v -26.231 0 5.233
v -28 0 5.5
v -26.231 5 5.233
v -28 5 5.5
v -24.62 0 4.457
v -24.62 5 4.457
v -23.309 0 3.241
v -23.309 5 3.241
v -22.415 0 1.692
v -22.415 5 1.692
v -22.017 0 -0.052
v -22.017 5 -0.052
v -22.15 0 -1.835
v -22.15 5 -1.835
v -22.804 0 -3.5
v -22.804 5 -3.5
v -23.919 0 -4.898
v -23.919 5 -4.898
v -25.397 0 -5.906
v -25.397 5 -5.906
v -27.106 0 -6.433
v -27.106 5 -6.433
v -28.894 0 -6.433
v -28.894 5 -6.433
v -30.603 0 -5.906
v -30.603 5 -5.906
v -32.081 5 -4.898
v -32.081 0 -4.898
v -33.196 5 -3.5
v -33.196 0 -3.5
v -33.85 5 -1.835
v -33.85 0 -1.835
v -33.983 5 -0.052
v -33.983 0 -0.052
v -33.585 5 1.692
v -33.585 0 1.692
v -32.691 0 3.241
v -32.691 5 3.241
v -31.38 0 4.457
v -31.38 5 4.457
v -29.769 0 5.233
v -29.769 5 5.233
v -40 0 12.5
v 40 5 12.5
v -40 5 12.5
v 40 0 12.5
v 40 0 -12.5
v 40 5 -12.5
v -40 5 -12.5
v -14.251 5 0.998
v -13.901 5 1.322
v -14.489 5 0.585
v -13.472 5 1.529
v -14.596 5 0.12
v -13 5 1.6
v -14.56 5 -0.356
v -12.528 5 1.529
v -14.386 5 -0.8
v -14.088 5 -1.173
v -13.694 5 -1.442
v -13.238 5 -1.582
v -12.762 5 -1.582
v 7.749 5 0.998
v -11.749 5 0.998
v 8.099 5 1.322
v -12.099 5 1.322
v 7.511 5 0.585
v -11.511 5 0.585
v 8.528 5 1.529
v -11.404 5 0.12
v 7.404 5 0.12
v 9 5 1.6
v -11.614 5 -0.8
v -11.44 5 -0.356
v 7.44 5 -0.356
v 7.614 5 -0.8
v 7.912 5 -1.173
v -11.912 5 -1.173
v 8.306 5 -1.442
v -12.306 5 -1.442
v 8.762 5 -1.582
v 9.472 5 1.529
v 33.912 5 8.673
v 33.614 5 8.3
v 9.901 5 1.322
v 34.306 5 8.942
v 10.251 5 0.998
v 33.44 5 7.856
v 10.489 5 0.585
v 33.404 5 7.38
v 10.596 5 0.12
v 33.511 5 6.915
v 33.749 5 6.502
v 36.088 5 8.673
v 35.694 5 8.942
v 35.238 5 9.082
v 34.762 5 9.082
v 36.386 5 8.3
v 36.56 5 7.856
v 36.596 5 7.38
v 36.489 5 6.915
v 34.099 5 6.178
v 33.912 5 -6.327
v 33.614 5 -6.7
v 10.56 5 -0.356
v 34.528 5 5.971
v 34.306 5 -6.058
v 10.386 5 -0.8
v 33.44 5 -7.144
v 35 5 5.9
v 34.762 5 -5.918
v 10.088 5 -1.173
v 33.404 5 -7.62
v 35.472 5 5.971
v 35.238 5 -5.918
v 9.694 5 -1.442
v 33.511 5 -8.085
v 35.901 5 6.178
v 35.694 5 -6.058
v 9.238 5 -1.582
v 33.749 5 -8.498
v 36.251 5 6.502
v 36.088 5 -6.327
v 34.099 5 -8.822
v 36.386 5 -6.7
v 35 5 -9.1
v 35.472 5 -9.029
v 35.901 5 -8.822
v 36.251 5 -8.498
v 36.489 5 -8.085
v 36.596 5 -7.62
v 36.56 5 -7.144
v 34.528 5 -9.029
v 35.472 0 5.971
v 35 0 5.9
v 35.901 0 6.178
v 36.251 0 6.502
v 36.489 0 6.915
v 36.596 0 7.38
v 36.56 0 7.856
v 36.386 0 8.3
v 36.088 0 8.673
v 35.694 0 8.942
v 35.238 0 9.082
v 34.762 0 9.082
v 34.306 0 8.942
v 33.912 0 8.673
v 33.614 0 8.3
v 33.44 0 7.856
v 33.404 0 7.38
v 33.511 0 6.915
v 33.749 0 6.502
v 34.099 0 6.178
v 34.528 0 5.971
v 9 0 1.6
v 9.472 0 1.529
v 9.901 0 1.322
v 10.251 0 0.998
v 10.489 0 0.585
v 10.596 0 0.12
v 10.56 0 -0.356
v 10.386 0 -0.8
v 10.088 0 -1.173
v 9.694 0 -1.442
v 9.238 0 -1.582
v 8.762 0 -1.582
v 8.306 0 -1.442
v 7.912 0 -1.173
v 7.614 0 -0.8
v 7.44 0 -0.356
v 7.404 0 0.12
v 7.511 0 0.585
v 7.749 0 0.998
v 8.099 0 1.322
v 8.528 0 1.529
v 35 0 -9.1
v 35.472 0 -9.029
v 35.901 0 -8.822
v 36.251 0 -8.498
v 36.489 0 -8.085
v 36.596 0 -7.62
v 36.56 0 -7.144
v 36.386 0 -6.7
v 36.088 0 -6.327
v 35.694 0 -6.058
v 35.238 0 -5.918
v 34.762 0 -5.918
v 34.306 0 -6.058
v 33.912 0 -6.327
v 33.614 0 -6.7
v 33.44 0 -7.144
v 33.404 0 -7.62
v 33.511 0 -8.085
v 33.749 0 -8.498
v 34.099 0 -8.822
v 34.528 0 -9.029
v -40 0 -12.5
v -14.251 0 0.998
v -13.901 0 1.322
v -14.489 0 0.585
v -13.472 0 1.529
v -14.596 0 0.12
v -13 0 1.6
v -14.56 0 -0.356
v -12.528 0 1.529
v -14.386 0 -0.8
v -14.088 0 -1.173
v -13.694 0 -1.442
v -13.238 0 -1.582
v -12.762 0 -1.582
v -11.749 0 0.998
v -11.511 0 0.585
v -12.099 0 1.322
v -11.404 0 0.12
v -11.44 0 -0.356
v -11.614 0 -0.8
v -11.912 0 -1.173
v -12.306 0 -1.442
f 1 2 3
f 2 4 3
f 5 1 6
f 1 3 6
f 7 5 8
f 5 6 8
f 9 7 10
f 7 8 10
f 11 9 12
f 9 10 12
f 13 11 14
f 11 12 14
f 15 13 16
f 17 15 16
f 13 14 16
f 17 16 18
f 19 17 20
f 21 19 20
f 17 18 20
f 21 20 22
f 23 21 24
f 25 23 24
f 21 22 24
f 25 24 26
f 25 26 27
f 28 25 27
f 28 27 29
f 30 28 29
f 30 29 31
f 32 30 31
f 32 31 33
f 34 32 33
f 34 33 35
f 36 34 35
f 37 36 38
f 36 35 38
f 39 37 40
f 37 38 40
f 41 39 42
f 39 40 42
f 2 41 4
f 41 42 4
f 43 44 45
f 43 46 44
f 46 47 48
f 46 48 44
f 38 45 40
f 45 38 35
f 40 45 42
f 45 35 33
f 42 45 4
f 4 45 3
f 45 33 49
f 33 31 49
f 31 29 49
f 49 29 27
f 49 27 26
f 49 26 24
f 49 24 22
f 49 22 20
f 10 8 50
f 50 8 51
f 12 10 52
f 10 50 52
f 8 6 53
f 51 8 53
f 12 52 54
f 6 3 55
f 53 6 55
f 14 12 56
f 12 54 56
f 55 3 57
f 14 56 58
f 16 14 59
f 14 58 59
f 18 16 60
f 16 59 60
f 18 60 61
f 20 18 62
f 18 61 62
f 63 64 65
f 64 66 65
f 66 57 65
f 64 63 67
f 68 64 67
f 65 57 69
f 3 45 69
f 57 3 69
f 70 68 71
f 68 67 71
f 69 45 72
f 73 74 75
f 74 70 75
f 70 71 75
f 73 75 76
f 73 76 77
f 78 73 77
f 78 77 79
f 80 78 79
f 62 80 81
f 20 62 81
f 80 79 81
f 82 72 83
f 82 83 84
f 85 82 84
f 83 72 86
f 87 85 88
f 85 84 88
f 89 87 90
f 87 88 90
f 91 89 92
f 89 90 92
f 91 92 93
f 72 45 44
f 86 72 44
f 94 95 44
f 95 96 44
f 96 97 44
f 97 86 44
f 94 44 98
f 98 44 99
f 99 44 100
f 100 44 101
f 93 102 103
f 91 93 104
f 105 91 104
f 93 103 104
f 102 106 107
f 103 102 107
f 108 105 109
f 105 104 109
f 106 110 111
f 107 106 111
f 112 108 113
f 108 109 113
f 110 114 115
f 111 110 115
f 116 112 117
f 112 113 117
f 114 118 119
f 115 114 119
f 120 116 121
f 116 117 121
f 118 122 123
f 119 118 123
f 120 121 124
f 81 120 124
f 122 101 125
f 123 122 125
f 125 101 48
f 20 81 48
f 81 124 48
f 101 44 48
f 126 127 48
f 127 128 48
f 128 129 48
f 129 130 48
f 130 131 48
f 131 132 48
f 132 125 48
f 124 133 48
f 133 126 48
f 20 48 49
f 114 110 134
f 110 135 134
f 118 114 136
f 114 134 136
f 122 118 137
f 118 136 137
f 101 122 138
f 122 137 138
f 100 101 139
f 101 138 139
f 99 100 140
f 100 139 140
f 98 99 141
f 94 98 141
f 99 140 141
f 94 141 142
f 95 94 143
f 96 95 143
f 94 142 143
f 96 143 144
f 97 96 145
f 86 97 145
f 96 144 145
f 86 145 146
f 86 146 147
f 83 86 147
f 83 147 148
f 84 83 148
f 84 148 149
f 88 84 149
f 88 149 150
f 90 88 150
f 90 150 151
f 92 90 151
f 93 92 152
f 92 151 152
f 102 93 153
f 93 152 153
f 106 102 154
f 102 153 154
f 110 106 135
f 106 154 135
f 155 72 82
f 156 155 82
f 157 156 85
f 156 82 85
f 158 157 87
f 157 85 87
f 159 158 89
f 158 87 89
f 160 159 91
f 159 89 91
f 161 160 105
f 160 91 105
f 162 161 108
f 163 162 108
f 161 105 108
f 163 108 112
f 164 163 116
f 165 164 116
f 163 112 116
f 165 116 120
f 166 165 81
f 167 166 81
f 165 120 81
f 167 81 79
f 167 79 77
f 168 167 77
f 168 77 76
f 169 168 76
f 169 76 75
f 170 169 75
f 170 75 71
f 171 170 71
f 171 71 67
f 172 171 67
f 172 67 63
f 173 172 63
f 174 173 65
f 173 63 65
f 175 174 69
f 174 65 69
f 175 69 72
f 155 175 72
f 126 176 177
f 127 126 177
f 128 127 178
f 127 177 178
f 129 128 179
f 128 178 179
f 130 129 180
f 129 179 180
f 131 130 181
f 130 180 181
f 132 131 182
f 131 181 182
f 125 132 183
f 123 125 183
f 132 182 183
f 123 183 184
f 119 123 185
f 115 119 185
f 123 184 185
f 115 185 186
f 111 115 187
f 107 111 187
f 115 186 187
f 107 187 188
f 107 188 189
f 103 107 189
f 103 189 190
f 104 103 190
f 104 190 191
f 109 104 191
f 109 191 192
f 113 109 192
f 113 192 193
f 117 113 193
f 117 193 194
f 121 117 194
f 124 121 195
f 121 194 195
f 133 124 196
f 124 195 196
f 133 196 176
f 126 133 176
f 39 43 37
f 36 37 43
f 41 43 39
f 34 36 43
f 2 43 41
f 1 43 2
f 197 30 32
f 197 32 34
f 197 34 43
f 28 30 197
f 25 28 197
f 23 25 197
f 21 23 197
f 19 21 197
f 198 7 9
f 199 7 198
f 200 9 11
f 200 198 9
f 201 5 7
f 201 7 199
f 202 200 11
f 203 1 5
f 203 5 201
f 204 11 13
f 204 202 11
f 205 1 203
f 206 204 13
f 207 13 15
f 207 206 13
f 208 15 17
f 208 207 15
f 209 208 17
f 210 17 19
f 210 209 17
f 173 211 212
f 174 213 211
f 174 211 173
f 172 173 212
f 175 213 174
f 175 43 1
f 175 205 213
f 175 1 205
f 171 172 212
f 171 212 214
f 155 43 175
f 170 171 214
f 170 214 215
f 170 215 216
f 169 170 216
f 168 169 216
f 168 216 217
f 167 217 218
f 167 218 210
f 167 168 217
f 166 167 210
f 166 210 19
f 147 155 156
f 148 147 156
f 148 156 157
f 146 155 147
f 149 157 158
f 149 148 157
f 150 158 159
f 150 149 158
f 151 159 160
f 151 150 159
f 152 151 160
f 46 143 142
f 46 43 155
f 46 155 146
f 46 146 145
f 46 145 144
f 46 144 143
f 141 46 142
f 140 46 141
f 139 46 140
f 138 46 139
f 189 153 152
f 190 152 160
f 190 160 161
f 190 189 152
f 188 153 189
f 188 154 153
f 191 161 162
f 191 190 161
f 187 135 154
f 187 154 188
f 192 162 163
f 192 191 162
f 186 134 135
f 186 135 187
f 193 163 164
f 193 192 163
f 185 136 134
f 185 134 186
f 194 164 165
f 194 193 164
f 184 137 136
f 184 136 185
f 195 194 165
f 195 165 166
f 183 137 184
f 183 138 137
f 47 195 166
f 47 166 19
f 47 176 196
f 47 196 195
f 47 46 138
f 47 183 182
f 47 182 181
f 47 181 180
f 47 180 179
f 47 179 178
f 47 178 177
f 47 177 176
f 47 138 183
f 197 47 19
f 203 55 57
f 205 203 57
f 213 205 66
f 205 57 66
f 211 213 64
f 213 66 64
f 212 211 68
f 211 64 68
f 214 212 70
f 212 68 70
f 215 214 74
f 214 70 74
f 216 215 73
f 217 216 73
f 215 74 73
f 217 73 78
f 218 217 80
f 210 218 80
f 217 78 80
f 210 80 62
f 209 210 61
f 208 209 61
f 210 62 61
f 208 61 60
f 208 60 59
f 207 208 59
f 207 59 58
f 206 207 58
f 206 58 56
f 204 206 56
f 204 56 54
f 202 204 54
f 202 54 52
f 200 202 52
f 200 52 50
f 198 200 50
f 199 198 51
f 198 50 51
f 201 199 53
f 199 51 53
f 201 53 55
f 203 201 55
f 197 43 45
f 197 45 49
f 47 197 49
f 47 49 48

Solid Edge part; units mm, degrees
sketch "Sketch1" plane through (0, 0, 0) normal (0, 1, 0) x (-1, 0, 0)
  line L0 (40, -12.5) -> (-40, -12.5)
  line L1 (-40, -12.5) -> (-40, 12.5)
  line L2 (-40, 12.5) -> (40, 12.5)
  line L3 (40, 12.5) -> (40, -12.5)
  dimension "D1" = 80
  dimension "D2" = 25
extrude "Protrusion1" add sketch "Sketch1" along normal blind 5
hole "Hole_5" at (-28, 5, -0.5) direction (0, -1, 0) diameter 12 end through all
hole "Hole_15" at (35, 0, 7.5) direction (0, 1, 0) diameter 3.2 end through all
hole "Hole1" at (35, 0, -7.5) direction (0, 1, 0) diameter 3.2 end through all
hole "Hole_17" at (-13, 5, 0) direction (0, -1, 0) diameter 3.2 end up to next
hole "Hole2" at (9, 5, 0) direction (0, -1, 0) diameter 3.2 end up to next
properties material "アルミニウム, 5050"
